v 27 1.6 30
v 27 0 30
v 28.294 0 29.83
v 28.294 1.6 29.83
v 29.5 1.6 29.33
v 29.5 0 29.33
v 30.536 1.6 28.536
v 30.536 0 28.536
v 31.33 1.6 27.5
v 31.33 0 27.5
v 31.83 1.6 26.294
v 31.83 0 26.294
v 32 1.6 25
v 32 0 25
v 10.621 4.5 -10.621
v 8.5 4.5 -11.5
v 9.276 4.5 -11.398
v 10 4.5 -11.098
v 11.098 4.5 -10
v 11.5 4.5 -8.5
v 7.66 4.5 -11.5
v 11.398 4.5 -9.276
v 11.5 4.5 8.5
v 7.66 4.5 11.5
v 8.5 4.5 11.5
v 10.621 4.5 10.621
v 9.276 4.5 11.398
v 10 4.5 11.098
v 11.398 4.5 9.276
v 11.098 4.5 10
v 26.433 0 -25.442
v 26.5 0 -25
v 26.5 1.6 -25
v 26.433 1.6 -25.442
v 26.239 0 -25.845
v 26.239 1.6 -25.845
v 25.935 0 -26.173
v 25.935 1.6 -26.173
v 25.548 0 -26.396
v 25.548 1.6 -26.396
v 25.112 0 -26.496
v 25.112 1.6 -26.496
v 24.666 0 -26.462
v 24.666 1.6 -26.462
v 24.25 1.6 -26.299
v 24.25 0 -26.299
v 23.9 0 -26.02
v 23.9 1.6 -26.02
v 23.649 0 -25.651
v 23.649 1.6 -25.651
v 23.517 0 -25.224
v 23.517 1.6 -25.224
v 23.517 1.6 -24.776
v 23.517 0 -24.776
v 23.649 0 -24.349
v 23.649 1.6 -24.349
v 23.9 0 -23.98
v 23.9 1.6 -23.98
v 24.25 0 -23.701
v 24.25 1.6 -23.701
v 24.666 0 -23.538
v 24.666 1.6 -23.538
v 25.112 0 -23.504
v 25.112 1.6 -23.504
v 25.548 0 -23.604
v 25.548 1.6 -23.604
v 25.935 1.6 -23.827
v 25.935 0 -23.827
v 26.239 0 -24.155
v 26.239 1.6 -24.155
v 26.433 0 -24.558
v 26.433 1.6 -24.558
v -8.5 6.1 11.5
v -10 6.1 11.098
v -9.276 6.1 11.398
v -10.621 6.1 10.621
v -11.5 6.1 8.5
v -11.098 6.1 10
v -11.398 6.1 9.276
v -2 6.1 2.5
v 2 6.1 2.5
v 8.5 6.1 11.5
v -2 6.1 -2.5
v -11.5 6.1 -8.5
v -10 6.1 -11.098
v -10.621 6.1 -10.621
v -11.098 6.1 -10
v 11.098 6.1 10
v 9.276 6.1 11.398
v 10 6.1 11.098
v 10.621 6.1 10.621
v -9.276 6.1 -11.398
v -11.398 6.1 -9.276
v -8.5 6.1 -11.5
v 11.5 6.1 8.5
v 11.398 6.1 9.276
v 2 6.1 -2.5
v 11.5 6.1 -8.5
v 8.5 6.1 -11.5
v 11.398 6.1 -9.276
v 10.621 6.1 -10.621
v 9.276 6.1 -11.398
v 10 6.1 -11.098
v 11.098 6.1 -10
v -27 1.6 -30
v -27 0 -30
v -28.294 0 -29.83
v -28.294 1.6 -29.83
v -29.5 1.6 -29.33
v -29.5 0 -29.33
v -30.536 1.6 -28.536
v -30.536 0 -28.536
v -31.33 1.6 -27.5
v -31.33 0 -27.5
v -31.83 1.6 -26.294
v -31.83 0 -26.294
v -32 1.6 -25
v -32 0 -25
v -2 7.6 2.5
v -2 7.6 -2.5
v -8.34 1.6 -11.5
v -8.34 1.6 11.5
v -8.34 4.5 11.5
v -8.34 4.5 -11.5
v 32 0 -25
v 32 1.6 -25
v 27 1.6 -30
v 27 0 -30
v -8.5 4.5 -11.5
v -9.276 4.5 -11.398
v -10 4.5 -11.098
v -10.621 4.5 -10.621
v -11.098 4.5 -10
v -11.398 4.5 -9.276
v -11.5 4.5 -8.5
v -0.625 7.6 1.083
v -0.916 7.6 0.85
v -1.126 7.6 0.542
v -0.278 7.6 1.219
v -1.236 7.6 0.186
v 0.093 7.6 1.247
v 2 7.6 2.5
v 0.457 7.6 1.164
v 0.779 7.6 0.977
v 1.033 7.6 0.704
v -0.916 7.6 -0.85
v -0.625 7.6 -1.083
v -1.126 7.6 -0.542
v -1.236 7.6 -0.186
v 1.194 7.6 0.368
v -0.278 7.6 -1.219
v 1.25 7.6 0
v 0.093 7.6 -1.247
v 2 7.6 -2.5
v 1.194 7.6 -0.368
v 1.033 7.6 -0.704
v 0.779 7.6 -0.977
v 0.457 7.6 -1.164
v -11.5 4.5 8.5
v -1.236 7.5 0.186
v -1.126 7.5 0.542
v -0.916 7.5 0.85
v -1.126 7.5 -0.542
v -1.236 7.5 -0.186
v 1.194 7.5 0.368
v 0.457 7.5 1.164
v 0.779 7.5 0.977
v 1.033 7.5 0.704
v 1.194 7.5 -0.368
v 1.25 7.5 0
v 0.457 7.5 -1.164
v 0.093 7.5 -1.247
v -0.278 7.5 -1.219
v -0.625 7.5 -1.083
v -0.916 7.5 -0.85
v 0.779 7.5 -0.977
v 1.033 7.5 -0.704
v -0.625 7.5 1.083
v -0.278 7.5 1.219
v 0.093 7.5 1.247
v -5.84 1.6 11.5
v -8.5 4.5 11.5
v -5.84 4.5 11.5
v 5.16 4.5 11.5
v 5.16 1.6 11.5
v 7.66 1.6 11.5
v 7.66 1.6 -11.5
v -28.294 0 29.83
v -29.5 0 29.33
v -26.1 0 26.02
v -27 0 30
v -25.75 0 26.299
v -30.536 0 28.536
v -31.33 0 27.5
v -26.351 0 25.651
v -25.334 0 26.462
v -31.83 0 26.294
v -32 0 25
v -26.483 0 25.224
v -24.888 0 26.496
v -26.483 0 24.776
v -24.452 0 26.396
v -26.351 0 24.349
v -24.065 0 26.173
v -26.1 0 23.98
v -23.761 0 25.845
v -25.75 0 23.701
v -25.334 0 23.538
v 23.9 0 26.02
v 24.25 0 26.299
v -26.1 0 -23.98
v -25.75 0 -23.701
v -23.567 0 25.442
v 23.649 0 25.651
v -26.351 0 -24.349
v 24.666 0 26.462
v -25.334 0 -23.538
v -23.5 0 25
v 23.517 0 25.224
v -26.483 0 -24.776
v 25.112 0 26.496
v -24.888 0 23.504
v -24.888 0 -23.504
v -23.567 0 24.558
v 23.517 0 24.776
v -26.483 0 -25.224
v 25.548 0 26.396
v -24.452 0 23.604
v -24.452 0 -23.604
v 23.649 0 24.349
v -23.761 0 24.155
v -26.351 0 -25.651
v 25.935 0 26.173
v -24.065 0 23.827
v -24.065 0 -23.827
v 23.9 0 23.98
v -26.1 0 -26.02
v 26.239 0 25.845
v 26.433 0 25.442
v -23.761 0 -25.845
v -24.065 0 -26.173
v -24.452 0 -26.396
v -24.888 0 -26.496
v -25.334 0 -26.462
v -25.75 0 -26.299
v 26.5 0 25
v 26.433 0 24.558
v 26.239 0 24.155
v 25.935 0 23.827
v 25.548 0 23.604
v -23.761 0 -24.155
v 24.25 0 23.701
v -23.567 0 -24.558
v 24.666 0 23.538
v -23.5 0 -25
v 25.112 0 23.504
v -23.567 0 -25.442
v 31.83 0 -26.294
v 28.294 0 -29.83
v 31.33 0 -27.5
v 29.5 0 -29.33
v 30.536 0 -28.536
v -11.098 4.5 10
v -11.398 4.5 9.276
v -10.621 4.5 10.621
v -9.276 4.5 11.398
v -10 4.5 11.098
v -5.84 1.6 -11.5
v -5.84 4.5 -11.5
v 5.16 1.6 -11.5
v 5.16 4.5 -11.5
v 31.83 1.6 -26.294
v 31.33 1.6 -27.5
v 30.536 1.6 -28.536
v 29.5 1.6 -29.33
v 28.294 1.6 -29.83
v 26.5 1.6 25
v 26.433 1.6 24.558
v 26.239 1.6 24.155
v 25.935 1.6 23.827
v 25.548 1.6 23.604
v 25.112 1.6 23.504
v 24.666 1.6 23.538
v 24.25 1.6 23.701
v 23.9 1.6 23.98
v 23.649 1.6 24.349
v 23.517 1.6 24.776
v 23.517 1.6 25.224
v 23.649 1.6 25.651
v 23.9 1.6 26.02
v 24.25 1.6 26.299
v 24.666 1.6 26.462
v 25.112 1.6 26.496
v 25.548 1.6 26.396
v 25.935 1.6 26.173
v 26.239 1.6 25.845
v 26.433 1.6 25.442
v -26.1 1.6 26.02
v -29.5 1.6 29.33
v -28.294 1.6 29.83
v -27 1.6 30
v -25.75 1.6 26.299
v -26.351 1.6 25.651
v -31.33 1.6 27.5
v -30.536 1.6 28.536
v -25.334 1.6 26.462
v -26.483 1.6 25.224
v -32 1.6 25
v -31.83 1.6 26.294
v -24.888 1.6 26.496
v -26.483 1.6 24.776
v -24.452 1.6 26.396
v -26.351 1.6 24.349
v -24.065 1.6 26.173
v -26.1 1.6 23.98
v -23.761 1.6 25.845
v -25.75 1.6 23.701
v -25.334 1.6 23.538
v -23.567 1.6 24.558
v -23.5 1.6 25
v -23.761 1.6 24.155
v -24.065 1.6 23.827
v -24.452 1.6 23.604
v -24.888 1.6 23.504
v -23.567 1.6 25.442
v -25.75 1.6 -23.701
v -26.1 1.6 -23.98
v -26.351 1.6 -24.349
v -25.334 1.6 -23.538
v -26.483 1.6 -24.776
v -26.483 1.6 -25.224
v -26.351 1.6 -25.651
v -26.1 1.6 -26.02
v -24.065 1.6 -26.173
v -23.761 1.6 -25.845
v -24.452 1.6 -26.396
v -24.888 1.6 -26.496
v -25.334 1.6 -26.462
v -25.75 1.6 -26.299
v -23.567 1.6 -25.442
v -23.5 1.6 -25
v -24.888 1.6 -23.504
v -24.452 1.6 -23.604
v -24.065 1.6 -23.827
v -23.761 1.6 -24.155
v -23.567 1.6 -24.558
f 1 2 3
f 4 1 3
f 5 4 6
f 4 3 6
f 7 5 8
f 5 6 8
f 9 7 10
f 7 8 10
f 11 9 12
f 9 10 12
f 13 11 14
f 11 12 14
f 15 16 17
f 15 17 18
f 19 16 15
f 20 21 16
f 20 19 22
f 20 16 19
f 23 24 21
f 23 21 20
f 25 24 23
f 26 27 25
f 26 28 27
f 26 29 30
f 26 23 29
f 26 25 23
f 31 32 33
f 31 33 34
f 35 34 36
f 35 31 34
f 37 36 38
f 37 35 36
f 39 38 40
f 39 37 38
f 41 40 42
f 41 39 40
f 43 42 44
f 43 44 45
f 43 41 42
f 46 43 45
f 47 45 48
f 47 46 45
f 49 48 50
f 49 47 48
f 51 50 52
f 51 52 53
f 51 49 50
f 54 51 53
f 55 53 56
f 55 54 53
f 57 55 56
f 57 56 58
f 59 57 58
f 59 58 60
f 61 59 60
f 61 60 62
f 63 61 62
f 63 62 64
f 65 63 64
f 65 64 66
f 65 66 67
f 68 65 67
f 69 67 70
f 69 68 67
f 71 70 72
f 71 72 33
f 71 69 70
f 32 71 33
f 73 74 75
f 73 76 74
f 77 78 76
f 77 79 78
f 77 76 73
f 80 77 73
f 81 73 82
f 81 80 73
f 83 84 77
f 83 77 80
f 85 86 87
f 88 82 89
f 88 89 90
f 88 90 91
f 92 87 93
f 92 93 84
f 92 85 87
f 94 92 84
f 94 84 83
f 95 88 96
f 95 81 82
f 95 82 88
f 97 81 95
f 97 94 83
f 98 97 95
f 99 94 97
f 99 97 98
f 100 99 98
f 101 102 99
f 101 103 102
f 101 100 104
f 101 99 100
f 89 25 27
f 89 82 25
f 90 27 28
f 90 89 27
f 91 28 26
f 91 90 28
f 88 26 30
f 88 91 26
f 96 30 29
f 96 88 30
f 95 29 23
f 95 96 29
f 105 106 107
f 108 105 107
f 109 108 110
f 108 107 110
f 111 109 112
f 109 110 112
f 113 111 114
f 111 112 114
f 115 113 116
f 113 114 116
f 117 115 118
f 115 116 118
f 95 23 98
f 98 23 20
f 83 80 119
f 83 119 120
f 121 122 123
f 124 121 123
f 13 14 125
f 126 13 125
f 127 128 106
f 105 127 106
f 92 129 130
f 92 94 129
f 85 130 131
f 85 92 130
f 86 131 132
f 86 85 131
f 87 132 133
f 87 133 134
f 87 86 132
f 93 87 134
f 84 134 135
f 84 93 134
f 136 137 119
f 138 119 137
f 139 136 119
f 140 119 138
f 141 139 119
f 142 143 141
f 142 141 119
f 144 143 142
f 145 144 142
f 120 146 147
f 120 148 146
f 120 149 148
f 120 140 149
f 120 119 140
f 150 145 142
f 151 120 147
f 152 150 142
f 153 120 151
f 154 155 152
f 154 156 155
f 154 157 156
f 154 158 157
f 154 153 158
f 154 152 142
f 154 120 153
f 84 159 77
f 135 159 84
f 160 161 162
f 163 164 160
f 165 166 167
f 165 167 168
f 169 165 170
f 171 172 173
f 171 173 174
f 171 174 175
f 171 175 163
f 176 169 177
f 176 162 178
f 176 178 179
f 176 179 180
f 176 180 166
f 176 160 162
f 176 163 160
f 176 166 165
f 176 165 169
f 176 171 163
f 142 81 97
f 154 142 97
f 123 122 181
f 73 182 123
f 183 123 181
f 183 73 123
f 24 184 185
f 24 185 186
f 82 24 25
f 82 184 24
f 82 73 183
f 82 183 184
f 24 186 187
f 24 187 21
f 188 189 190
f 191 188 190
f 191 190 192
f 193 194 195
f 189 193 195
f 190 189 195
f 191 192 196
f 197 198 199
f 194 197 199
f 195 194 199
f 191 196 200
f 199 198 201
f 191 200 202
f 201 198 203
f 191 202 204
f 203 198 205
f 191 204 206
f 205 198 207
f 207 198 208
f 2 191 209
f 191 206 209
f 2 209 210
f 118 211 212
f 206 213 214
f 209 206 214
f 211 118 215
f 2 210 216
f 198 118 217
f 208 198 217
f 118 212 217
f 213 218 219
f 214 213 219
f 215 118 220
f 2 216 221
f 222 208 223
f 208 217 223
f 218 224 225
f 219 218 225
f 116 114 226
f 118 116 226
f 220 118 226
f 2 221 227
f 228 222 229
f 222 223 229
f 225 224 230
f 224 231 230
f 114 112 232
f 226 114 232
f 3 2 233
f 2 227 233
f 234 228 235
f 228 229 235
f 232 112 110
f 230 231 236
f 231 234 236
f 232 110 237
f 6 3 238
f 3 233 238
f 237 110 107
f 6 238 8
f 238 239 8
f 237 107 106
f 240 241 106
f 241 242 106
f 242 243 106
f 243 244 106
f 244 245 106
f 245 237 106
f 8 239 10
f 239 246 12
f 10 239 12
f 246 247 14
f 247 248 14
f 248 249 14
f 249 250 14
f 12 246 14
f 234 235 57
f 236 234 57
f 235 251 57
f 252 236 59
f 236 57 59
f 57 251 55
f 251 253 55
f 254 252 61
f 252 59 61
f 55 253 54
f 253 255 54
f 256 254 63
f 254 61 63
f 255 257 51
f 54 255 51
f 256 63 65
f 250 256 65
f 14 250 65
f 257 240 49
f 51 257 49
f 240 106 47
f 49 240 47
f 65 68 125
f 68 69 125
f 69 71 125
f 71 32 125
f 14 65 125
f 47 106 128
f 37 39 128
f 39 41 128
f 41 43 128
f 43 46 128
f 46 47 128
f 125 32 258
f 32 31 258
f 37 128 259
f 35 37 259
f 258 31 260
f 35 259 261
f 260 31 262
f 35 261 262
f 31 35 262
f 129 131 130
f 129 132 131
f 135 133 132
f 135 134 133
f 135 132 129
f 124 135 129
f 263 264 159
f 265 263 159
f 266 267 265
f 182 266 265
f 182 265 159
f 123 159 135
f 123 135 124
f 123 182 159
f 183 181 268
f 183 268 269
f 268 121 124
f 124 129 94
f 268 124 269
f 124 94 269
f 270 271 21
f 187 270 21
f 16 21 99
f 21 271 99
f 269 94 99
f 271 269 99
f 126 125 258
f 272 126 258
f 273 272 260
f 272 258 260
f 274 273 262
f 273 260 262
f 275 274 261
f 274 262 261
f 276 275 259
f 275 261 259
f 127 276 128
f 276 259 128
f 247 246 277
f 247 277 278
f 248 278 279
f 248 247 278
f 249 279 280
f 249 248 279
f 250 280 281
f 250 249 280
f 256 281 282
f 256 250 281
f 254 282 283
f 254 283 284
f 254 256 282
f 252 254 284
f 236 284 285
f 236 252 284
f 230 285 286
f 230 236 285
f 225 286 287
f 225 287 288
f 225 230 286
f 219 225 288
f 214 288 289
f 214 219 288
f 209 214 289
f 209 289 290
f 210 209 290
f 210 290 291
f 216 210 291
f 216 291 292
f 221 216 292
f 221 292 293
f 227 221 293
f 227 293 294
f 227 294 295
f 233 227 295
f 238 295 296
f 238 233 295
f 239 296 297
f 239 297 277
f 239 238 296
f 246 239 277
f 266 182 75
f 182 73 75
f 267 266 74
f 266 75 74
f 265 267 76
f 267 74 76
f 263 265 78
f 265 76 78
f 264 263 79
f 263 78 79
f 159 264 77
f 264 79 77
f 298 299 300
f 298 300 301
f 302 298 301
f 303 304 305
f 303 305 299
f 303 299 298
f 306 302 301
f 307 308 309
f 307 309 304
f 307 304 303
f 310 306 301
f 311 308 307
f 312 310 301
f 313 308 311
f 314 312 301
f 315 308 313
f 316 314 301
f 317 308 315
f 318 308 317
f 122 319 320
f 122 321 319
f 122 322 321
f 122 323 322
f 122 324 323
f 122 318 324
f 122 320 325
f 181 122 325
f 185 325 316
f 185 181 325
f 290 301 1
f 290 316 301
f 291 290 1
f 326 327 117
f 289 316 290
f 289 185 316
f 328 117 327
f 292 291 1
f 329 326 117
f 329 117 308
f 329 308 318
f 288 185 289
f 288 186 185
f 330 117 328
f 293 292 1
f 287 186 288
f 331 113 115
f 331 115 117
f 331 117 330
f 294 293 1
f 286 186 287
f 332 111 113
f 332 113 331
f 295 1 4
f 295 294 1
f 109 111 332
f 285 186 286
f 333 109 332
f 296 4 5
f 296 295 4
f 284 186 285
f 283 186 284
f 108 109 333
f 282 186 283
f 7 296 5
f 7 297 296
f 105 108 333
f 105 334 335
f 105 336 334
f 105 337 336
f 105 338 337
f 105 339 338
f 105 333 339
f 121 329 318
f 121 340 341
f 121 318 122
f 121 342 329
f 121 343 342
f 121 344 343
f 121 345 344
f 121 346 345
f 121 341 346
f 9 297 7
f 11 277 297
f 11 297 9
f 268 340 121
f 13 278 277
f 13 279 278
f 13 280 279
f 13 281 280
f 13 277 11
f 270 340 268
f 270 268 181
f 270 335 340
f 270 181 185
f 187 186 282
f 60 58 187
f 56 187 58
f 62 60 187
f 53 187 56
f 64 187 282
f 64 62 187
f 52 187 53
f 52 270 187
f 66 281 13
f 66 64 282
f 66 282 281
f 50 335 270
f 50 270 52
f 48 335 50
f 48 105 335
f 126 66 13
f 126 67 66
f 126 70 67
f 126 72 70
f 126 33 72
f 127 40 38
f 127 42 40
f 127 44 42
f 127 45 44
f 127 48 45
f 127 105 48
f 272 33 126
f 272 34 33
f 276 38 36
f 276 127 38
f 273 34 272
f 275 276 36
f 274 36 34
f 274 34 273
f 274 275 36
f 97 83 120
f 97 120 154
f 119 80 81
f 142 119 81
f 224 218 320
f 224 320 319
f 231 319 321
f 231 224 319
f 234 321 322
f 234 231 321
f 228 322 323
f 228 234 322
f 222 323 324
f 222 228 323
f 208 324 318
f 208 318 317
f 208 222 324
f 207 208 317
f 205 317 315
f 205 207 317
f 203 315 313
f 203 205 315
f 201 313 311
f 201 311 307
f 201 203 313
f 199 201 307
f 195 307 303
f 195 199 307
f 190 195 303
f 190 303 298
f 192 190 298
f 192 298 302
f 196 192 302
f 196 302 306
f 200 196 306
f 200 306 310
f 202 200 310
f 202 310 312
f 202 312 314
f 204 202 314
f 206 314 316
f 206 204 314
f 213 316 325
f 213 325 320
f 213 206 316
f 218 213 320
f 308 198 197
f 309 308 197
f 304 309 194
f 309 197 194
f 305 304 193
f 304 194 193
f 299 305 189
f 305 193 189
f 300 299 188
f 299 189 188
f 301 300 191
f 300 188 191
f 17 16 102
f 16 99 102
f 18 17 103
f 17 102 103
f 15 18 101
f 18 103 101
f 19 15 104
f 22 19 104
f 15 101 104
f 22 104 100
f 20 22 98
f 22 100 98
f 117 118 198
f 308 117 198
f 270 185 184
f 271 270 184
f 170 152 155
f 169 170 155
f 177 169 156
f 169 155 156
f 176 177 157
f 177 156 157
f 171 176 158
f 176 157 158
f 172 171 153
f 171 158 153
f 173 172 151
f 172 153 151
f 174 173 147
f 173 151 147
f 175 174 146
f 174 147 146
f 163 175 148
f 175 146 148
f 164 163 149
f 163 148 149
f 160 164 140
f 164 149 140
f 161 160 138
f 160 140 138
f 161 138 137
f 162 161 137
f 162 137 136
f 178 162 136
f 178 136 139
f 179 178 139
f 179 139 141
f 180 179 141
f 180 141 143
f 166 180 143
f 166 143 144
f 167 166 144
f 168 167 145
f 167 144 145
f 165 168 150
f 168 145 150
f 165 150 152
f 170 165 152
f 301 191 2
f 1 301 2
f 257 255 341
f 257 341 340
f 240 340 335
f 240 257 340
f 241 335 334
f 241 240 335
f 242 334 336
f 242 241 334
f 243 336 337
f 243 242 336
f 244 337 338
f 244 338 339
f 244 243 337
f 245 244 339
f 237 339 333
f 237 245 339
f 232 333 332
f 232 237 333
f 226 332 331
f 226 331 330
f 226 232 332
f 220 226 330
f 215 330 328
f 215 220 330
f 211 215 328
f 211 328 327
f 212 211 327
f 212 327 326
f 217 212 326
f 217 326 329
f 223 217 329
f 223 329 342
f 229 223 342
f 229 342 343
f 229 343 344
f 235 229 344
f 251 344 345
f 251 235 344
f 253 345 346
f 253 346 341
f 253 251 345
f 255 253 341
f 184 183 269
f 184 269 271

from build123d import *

# Parameters (mm, degrees)
SKETCH1_R           = 1.5
BOSS_EXTRUDE1_DEPTH = 1.6
SKETCH2_W           = 23
SKETCH2_H           = 23
BOSS_EXTRUDE2_DEPTH = 4.5
SKETCH3_W           = 4
SKETCH3_H           = 5
BOSS_EXTRUDE3_DEPTH = 1.5
SKETCH4_W           = 23
SKETCH4_H           = 2.9
CUT_EXTRUDE3_DEPTH  = 39.5
SKETCH5_W           = 2.5
SKETCH5_H           = 2.9
BOSS_EXTRUDE4_DEPTH = 23
FILLET1_R           = 3
SKETCH6_R           = 1.25
CUT_EXTRUDE4_DEPTH  = 0.1


with BuildPart() as part:
    # Sketch1 → Boss-Extrude1 (new body)
    with BuildSketch(Plane(origin=(0, 0, 0), x_dir=(1, 0, 0), z_dir=(0, 1, 0))):
        with BuildLine():
            Line((-27, -30), (27, -30))
            ThreePointArc((27, -30), (30.535533906, -28.535533906), (32, -25))
            Line((32, -25), (32, 25))
            ThreePointArc((32, 25), (30.535533906, 28.535533906), (27, 30))
            Line((27, 30), (-27, 30))
            ThreePointArc((-27, 30), (-30.535533906, 28.535533906), (-32, 25))
            Line((-32, 25), (-32, -25))
            ThreePointArc((-32, -25), (-30.535533906, -28.535533906), (-27, -30))
        make_face()
        with Locations((25, 25)):
            Circle(SKETCH1_R, mode=Mode.SUBTRACT)
        with Locations((-25, 25)):
            Circle(SKETCH1_R, mode=Mode.SUBTRACT)
        with Locations((-25, -25)):
            Circle(SKETCH1_R, mode=Mode.SUBTRACT)
        with Locations((25, -25)):
            Circle(SKETCH1_R, mode=Mode.SUBTRACT)
    extrude(amount=BOSS_EXTRUDE1_DEPTH)

    # Sketch2 → Boss-Extrude2 (add)
    with BuildSketch(Plane(origin=(0, 1.6, 0), x_dir=(1, 0, 0), z_dir=(0, 1, 0))):
        Rectangle(SKETCH2_W, SKETCH2_H)
    extrude(amount=BOSS_EXTRUDE2_DEPTH)

    # Sketch3 → Boss-Extrude3 (add)
    with BuildSketch(Plane(origin=(0, 6.1, 0), x_dir=(1, 0, 0), z_dir=(0, 1, 0))):
        Rectangle(SKETCH3_W, SKETCH3_H)
    extrude(amount=BOSS_EXTRUDE3_DEPTH)

    # Sketch4 → Cut-Extrude3 (cut)
    with BuildSketch(Plane.XY.offset(11.5)):
        with Locations((0, 3.05)):
            Rectangle(SKETCH4_W, SKETCH4_H)
    extrude(amount=-CUT_EXTRUDE3_DEPTH, mode=Mode.SUBTRACT)

    # Sketch5 → Boss-Extrude4 (add)
    with BuildSketch(Plane.XY.offset(11.5)):
        with Locations((-7.09044311, 3.05)):
            Rectangle(SKETCH5_W, SKETCH5_H)
        with Locations((6.40955689, 3.05)):
            Rectangle(SKETCH5_W, SKETCH5_H)
    extrude(amount=-BOSS_EXTRUDE4_DEPTH)

    # Fillet1
    fillet1_edges = [part.edges().sort_by_distance(p)[0] for p in [
        (11.5, 5.3, 11.5),
        (11.5, 5.3, -11.5),
        (-11.5, 5.3, -11.5),
        (-11.5, 5.3, 11.5),
    ]]
    fillet(fillet1_edges, radius=FILLET1_R)

    # Sketch6 → Cut-Extrude4 (cut)
    with BuildSketch(Plane(origin=(0, 7.6, 0), x_dir=(1, 0, 0), z_dir=(0, 1, 0))):
        Circle(SKETCH6_R)
    extrude(amount=-CUT_EXTRUDE4_DEPTH, mode=Mode.SUBTRACT)


solid = part.part
